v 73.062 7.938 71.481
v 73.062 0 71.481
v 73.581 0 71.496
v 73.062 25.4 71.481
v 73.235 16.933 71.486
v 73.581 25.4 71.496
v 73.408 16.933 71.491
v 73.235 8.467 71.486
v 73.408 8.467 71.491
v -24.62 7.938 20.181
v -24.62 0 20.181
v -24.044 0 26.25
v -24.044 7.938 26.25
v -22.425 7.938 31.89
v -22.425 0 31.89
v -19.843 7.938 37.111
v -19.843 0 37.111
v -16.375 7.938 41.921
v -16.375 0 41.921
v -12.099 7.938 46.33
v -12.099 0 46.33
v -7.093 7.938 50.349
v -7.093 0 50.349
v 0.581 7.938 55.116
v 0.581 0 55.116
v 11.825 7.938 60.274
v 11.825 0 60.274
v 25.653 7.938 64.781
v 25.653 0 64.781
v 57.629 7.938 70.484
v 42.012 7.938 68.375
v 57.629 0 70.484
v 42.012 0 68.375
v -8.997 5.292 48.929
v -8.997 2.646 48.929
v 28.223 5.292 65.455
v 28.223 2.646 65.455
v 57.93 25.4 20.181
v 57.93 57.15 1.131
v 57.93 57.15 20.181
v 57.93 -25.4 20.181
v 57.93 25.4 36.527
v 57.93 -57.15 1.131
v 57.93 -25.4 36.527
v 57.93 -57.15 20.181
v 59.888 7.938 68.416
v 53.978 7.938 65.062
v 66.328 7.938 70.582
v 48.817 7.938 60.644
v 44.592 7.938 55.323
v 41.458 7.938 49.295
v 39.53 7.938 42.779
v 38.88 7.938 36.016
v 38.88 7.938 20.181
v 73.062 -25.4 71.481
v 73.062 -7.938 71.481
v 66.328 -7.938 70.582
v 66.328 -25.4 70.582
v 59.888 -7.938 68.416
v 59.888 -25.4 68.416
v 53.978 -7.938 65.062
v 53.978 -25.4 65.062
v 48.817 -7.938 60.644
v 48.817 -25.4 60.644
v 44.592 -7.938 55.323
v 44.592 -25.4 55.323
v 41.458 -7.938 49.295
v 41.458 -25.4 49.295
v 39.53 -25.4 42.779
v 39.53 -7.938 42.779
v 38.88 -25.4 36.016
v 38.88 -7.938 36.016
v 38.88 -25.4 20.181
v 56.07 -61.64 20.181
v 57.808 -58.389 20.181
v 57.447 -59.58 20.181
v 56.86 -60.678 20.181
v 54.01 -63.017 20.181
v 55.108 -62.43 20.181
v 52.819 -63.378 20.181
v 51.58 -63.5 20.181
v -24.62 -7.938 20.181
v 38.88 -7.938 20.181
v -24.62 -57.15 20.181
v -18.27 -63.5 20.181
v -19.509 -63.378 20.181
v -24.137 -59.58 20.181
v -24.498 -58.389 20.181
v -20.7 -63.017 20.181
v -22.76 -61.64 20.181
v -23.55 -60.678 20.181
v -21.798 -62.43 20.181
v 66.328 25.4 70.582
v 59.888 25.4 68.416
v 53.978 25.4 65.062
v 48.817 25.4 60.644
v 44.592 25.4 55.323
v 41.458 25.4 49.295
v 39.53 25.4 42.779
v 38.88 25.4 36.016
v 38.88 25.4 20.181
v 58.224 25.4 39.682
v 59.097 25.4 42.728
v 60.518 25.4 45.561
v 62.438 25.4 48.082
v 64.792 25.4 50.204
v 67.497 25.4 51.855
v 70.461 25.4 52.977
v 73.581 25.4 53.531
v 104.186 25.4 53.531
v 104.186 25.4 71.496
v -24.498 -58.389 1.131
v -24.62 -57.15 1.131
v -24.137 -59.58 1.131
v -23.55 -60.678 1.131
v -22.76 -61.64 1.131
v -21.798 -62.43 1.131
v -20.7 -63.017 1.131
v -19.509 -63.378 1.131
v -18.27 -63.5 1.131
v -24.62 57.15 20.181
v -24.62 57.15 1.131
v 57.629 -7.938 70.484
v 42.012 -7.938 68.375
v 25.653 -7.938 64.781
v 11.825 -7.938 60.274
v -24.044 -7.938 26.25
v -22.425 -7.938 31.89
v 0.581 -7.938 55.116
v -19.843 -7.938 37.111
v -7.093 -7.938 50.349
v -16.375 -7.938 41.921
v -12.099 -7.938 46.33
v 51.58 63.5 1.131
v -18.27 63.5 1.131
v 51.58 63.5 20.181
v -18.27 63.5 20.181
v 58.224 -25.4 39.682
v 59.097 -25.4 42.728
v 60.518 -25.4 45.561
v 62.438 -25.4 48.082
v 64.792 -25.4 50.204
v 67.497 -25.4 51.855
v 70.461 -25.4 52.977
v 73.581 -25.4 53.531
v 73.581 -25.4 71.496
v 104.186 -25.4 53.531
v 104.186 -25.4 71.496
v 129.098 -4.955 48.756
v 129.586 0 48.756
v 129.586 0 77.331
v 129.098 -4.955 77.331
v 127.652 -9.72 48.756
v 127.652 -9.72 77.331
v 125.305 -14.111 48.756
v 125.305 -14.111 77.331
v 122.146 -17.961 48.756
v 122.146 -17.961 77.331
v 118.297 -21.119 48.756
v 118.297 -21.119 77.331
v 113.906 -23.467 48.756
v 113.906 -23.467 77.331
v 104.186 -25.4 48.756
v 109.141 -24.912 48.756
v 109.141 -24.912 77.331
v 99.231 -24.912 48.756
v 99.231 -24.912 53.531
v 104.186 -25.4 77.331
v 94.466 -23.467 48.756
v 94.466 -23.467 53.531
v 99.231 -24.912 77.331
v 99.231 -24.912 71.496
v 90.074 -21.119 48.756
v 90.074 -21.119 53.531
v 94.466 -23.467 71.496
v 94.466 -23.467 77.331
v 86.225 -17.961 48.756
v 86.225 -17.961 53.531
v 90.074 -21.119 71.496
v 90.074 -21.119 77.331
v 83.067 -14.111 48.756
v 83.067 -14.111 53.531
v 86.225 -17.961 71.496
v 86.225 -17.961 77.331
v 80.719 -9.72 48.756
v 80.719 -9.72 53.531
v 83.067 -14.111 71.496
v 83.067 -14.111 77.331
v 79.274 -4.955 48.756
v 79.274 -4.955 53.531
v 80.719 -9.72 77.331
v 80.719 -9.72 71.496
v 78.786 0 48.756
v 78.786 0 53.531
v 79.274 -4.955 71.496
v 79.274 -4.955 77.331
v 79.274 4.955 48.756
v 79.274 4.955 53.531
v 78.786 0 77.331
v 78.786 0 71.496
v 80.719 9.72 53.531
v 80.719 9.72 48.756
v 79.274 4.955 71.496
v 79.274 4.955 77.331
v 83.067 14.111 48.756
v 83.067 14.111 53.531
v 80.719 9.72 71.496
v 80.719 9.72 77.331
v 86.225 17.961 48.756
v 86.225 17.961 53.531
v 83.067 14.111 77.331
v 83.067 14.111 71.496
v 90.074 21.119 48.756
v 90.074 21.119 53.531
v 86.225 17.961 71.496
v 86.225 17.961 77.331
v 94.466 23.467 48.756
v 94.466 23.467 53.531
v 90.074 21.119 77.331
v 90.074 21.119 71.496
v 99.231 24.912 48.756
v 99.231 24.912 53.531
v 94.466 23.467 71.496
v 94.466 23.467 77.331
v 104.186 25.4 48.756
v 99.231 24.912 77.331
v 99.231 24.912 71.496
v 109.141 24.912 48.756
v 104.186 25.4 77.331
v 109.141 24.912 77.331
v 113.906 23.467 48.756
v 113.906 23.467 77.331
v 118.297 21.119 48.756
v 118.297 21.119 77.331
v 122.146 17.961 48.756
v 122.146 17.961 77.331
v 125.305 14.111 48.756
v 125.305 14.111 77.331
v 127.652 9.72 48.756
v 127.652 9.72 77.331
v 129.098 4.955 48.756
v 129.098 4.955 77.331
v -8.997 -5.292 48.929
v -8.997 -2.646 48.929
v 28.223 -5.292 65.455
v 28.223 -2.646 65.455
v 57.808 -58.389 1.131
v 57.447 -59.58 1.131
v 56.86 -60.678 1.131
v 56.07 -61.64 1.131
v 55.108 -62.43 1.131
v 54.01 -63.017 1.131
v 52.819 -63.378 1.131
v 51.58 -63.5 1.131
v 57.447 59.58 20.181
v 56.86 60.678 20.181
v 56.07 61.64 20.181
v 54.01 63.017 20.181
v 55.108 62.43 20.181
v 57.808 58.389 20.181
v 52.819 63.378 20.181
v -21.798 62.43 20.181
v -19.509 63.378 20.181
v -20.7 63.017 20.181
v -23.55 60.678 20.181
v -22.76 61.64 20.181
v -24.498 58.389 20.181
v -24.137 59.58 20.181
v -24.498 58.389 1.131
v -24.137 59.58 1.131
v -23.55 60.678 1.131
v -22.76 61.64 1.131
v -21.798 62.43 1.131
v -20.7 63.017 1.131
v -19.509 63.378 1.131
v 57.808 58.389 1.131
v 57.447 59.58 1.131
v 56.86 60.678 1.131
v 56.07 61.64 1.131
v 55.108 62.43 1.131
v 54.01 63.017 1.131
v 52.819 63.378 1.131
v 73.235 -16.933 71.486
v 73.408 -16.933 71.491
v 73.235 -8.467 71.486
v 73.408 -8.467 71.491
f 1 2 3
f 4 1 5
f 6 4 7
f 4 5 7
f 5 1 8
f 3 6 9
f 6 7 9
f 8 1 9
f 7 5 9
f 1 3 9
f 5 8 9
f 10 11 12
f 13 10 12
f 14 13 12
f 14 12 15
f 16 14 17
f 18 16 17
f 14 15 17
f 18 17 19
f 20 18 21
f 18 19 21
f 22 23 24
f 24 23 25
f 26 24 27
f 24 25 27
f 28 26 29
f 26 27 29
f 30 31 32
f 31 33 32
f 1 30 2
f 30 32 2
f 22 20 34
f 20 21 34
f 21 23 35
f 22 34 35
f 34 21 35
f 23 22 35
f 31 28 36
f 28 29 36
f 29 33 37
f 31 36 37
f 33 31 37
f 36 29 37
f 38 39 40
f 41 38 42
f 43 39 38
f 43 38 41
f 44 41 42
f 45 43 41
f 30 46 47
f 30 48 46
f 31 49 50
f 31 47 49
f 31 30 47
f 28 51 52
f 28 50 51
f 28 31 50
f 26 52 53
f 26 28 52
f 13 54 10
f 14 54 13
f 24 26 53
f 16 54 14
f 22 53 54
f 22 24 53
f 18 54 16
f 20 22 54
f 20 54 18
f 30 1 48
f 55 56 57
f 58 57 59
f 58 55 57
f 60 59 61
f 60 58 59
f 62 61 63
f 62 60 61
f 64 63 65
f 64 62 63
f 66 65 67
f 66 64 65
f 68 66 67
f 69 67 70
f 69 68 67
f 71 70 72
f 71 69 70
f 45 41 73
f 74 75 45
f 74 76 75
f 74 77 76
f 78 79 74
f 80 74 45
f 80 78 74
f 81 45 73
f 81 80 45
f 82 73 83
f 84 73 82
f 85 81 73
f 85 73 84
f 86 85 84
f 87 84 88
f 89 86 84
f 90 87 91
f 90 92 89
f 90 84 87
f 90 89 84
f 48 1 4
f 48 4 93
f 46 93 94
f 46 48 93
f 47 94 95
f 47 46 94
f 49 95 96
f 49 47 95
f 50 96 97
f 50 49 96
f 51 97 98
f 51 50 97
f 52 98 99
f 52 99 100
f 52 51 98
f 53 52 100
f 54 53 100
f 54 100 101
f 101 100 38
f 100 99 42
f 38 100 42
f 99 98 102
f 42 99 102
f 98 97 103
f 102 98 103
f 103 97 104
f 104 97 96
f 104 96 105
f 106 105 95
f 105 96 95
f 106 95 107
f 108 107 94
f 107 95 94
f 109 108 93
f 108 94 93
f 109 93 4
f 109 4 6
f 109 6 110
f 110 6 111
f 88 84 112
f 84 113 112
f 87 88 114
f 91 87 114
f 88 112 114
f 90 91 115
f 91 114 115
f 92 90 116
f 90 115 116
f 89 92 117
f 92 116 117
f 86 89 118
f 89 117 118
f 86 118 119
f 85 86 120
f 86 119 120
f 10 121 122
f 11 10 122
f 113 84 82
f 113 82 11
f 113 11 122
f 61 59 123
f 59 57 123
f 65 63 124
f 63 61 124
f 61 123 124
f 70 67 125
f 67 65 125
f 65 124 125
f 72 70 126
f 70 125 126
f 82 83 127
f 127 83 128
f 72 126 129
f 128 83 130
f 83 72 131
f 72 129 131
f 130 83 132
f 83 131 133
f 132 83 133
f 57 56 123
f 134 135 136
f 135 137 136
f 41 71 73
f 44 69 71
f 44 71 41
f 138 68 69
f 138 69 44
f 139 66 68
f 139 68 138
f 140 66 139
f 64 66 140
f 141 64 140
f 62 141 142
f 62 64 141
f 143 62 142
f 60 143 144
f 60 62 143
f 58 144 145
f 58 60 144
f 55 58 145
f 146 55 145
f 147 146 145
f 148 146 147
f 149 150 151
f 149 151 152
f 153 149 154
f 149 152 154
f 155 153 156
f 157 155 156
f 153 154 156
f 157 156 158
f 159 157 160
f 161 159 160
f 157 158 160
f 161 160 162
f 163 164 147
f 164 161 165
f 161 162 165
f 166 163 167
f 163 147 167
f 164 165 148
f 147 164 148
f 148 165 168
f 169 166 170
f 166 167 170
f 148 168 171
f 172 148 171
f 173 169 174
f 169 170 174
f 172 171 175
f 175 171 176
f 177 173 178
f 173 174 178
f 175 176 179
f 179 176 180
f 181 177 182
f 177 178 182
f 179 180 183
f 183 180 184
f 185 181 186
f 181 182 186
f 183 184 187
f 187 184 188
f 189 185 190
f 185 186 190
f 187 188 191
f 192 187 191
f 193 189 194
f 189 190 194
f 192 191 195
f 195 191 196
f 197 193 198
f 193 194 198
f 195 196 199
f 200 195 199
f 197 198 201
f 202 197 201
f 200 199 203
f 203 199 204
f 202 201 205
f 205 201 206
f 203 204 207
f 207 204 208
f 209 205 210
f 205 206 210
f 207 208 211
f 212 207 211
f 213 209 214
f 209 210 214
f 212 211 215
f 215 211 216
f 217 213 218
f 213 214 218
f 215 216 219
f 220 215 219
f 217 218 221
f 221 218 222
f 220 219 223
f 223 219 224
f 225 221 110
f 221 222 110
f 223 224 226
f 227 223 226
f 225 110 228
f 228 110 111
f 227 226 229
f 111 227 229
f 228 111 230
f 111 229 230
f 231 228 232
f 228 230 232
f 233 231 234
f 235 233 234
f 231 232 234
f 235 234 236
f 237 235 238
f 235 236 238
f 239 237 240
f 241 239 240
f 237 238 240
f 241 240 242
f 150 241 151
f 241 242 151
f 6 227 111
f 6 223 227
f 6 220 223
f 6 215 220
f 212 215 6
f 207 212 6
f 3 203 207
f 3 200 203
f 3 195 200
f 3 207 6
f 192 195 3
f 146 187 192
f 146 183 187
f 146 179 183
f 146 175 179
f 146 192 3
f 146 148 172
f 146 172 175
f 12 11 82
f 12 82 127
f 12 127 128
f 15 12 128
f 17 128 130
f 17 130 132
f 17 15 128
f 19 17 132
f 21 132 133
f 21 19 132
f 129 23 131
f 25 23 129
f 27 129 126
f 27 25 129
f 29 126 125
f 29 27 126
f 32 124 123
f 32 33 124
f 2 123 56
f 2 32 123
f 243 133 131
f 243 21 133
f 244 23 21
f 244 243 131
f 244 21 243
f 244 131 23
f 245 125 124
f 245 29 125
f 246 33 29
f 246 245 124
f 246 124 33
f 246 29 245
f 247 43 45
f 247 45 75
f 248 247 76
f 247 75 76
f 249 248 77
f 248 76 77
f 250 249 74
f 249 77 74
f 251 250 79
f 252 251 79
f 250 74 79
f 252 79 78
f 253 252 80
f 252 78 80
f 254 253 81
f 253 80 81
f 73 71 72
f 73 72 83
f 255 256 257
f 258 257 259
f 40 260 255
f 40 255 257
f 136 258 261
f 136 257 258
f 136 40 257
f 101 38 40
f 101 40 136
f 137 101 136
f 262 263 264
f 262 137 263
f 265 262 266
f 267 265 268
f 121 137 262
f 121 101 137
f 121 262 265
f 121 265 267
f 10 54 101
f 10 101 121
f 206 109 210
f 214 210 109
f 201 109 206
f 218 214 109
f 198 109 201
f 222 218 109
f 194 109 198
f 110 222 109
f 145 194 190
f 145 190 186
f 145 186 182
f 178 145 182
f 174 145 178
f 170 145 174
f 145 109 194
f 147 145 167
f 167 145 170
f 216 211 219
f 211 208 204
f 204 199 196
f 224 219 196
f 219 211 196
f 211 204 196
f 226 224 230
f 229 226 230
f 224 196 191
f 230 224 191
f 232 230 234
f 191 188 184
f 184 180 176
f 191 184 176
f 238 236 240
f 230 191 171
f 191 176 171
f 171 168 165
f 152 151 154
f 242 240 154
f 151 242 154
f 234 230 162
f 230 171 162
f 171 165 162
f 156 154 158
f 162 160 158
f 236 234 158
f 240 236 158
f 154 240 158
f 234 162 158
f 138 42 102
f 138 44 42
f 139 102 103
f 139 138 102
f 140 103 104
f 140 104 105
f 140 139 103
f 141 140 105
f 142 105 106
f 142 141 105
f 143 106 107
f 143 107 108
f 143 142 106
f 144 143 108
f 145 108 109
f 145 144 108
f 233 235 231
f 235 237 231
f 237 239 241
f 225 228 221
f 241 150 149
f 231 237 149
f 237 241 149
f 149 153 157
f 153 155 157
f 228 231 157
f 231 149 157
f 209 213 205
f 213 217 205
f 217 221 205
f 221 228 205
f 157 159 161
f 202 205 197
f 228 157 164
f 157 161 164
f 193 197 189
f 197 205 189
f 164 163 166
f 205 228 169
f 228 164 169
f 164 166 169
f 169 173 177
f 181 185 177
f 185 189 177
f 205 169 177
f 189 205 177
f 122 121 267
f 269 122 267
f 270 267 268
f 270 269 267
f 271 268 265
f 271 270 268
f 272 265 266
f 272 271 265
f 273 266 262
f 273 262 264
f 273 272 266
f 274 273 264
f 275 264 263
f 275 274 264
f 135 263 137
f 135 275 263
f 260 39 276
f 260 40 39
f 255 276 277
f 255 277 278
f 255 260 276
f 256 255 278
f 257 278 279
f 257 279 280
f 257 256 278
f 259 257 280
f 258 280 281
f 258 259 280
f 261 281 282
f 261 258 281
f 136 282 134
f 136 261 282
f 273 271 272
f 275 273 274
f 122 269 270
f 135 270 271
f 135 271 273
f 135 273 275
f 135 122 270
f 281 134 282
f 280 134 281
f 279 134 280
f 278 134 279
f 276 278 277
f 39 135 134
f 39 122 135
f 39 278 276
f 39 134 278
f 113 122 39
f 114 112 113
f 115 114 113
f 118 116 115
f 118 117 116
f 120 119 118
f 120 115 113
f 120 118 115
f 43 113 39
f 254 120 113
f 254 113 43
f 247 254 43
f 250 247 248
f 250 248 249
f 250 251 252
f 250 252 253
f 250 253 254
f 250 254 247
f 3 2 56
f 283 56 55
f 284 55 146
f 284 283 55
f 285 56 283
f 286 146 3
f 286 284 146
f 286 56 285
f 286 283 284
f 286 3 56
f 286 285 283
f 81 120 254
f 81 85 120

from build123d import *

# Parameters (mm, degrees)
F1_DEPTH = 63.5
F0_W     = 25.4
F0_H     = 17.965186498
F2_DEPTH = 25.4
F3_DEPTH = 7.9375
F5_R     = 6.35


with BuildPart() as f1:
    # F0 (on Front) → F1 (new body, symmetric)
    with BuildSketch(Plane.XZ):
        Polygon((38.8800390695, 20.1806084275), (-24.6199609305, 20.1806084275), (-24.6199609305, 1.1306084275), (57.9300390695, 1.1306084275), (57.9300390695, 20.1806084275), align=None)
    extrude(amount=F1_DEPTH, both=True)

    # F0 (on Front) → F2 (join, symmetric)
    with BuildSketch(Plane.XZ):
        with Locations((91.4859331562, 62.5134016765)):
            Rectangle(F0_W, F0_H)
        with BuildLine():
            Line((38.8800390695, 36.0163077712), (38.8800390695, 20.1806084275))
            Line((38.8800390695, 20.1806084275), (57.9300390695, 20.1806084275))
            Line((57.9300390695, 20.1806084275), (57.9300390695, 36.5266351785))
            ThreePointArc((57.9300390695, 36.5266351785), (62.4384600836, 48.0819539272), (73.5812261701, 53.5308084275))
            Line((73.5812261701, 53.5308084275), (78.7859331562, 53.5308084275))
            Line((78.7859331562, 53.5308084275), (78.7859331562, 71.4959949255))
            Line((78.7859331562, 71.4959949255), (73.5812261701, 71.4959949255))
            add(Edge.make_bspline(
                [(73.0621663059, 71.4806777175), (73.2353354158, 71.485987393), (73.4083566499, 71.4910929714), (73.5812261701, 71.4959949255)],
                knots=[110.3659801148, 110.3659801148, 110.3659801148, 110.3659801148, 110.8004604656, 110.8004604656, 110.8004604656, 110.8004604656], degree=3))
            ThreePointArc((73.0621663059, 71.4806777175), (48.816685952, 60.6442358108), (38.8800390695, 36.0163077712))
        make_face()
    extrude(amount=F2_DEPTH, both=True)

    # F0 (on Front) → F3 (join, symmetric)
    with BuildSketch(Plane.XZ):
        with BuildLine():
            add(Edge.make_bspline(
                [(-24.6199609305, 20.1806084275), (-24.4558339647, 55.6137443141), (29.0740353989, 70.1319227371), (73.0621663059, 71.4806777175)],
                knots=[0, 0, 0, 0, 110.3659801148, 110.3659801148, 110.3659801148, 110.3659801148], degree=3))
            Line((-24.6199609305, 20.1806084275), (38.8800390695, 20.1806084275))
            Line((38.8800390695, 20.1806084275), (38.8800390695, 36.0163077712))
            ThreePointArc((38.8800390695, 36.0163077712), (48.816685952, 60.6442358108), (73.0621663059, 71.4806777175))
        make_face()
    extrude(amount=F3_DEPTH, both=True)

    # F0 (on Front) → F4 (revolve)
    with BuildSketch(Plane.XZ):
        Polygon((104.1859331562, 77.3306084275), (104.1859331562, 71.4959949255), (104.1859331562, 53.5308084275), (104.1859331562, 48.7556084275), (129.5859331562, 48.7556084275), (129.5859331562, 77.3306084275), align=None)
    revolve(axis=Axis((104.1859331562, 0, 63.0431084275), (0, 0, -1)))

    # F5
    f5_edges = [f1.edges().sort_by_distance(p)[0] for p in [
        (57.930039, 63.5, 10.655608),
        (57.930039, -63.5, 10.655608),
        (-24.619961, 63.5, 10.655608),
        (-24.619961, -63.5, 10.655608),
    ]]
    fillet(f5_edges, radius=F5_R)


solid = f1.part
